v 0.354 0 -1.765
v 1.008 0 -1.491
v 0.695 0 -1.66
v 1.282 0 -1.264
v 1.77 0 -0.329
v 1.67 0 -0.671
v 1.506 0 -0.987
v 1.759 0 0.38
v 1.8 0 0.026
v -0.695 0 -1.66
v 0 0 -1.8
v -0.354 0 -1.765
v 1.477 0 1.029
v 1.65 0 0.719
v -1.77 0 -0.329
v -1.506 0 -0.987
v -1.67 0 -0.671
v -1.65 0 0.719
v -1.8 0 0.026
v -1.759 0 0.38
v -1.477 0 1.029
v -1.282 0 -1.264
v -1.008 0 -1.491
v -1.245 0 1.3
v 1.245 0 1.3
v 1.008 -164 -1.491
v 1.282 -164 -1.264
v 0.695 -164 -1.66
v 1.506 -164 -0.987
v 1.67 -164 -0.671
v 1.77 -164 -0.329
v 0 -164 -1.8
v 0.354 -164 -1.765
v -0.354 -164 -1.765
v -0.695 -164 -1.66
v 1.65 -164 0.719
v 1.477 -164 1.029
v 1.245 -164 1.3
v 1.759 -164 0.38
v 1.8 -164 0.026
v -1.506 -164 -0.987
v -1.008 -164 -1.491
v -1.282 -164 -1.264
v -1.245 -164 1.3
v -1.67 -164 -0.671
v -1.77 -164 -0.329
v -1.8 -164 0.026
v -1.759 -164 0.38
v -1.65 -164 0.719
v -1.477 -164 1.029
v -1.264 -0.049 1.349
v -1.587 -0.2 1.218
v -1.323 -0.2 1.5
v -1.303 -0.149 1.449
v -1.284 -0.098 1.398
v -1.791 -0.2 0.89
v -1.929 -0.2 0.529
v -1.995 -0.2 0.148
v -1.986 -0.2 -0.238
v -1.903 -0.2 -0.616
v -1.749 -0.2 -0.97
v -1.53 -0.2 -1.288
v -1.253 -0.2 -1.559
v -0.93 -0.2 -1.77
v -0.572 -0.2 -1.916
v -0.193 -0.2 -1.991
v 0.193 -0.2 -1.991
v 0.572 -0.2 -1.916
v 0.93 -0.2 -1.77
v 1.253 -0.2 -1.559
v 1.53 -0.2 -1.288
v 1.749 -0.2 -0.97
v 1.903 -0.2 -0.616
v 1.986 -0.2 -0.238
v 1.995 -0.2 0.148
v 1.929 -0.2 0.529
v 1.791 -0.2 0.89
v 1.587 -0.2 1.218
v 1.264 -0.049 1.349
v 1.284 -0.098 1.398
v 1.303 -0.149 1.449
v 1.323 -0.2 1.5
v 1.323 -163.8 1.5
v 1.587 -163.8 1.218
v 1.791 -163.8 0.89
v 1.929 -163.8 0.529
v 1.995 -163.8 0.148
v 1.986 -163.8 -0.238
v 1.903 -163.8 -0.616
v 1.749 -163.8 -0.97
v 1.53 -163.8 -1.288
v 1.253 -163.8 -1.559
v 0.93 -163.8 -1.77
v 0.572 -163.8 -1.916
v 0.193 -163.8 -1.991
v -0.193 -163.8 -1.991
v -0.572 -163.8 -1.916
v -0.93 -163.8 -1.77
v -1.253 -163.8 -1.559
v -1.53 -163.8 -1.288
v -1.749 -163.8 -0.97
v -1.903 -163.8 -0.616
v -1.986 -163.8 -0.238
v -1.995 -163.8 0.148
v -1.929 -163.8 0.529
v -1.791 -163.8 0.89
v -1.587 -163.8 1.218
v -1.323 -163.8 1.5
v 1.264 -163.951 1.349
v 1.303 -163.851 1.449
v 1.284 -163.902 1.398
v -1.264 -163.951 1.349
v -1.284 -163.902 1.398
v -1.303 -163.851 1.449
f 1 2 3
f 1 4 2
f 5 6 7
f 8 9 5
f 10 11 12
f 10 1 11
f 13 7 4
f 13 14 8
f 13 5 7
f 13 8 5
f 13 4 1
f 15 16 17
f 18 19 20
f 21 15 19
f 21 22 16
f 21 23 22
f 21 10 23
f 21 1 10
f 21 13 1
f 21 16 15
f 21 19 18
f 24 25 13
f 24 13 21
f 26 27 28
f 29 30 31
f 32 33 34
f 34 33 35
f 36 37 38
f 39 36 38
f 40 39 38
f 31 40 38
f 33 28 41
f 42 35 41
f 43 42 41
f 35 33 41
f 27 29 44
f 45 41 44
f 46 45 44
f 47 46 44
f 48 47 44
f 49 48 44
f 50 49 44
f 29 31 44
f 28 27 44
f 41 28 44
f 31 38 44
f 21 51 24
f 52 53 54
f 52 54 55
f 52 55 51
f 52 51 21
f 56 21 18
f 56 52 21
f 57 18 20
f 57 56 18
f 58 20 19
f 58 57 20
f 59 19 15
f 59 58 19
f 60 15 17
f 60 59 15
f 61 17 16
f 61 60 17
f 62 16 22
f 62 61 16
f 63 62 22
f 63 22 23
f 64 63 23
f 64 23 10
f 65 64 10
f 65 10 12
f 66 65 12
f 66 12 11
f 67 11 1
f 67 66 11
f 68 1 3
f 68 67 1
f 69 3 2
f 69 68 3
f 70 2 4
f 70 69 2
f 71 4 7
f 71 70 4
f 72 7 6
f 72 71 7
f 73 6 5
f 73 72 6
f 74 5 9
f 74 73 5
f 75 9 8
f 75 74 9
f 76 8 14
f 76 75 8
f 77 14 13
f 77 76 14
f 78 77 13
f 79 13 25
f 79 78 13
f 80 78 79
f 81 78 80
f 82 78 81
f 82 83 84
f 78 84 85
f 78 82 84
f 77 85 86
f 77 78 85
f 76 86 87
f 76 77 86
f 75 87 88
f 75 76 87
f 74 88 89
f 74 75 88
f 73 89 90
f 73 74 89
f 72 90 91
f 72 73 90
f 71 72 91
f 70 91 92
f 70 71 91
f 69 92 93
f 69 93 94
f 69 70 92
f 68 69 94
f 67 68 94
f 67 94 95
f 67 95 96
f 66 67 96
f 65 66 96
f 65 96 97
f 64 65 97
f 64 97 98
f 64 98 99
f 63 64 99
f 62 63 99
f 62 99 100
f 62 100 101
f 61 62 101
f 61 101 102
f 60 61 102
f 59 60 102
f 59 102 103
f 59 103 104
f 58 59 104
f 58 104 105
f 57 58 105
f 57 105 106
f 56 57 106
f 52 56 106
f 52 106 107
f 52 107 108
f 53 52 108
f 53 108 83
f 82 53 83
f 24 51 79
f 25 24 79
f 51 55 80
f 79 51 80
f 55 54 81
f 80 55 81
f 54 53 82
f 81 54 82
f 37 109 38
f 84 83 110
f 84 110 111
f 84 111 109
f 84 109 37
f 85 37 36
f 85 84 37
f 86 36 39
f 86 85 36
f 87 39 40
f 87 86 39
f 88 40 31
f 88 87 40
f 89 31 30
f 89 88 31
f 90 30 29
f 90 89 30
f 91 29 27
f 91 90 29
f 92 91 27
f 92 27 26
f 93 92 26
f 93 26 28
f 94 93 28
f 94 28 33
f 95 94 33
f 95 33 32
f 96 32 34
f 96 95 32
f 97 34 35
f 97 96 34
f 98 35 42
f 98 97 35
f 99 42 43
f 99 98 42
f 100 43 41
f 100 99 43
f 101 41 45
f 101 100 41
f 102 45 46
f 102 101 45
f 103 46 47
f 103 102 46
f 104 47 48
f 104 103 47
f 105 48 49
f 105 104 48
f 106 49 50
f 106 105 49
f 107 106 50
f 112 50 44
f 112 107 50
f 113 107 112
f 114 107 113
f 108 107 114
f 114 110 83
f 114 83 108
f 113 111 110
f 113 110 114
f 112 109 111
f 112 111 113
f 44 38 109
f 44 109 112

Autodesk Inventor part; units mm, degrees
ref_plane "YZ Plane" through (0, 0, 0) normal (1, 0, 0) x (0, 1, 0)
ref_plane "XZ Plane" through (0, 0, 0) normal (0, 1, 0) x (-1, 0, 0)
ref_plane "XY Plane" through (0, 0, 0) normal (0, 0, 1) x (1, 0, 0)
sketch "Sketch1" plane through (0, 0, 0) normal (0, 1, 0) x (-1, 0, 0)
  circle A0 centre (0, 0) radius 2
  dimension "d0" = 4
extrude "Extrusion1" add sketch "Sketch1" against normal blind 164
sketch "Sketch2" plane through (0, -164, 0) normal (0, -1, 0) x (1, 0, 0)
  circle A0 centre (0, 0) radius 2 projected
  line L0 (-1.3229, 1.5) -> (1.3229, 1.5)
  circle A1 centre (0, 0) radius 2 projected
  dimension "d3" = 0.5
extrude "Extrusion2" cut sketch "Sketch2" against normal through all contours L0 A0 picked at (-0.3089, 1.5908)
chamfer "Chamfer1" distance 0.2 angle 45 4 edges at (0, -164, -2) (0, -164, 1.5) (0, 0, -2) (0, 0, 1.5)
properties part number "10-0164" material "Aluminum 6061"
